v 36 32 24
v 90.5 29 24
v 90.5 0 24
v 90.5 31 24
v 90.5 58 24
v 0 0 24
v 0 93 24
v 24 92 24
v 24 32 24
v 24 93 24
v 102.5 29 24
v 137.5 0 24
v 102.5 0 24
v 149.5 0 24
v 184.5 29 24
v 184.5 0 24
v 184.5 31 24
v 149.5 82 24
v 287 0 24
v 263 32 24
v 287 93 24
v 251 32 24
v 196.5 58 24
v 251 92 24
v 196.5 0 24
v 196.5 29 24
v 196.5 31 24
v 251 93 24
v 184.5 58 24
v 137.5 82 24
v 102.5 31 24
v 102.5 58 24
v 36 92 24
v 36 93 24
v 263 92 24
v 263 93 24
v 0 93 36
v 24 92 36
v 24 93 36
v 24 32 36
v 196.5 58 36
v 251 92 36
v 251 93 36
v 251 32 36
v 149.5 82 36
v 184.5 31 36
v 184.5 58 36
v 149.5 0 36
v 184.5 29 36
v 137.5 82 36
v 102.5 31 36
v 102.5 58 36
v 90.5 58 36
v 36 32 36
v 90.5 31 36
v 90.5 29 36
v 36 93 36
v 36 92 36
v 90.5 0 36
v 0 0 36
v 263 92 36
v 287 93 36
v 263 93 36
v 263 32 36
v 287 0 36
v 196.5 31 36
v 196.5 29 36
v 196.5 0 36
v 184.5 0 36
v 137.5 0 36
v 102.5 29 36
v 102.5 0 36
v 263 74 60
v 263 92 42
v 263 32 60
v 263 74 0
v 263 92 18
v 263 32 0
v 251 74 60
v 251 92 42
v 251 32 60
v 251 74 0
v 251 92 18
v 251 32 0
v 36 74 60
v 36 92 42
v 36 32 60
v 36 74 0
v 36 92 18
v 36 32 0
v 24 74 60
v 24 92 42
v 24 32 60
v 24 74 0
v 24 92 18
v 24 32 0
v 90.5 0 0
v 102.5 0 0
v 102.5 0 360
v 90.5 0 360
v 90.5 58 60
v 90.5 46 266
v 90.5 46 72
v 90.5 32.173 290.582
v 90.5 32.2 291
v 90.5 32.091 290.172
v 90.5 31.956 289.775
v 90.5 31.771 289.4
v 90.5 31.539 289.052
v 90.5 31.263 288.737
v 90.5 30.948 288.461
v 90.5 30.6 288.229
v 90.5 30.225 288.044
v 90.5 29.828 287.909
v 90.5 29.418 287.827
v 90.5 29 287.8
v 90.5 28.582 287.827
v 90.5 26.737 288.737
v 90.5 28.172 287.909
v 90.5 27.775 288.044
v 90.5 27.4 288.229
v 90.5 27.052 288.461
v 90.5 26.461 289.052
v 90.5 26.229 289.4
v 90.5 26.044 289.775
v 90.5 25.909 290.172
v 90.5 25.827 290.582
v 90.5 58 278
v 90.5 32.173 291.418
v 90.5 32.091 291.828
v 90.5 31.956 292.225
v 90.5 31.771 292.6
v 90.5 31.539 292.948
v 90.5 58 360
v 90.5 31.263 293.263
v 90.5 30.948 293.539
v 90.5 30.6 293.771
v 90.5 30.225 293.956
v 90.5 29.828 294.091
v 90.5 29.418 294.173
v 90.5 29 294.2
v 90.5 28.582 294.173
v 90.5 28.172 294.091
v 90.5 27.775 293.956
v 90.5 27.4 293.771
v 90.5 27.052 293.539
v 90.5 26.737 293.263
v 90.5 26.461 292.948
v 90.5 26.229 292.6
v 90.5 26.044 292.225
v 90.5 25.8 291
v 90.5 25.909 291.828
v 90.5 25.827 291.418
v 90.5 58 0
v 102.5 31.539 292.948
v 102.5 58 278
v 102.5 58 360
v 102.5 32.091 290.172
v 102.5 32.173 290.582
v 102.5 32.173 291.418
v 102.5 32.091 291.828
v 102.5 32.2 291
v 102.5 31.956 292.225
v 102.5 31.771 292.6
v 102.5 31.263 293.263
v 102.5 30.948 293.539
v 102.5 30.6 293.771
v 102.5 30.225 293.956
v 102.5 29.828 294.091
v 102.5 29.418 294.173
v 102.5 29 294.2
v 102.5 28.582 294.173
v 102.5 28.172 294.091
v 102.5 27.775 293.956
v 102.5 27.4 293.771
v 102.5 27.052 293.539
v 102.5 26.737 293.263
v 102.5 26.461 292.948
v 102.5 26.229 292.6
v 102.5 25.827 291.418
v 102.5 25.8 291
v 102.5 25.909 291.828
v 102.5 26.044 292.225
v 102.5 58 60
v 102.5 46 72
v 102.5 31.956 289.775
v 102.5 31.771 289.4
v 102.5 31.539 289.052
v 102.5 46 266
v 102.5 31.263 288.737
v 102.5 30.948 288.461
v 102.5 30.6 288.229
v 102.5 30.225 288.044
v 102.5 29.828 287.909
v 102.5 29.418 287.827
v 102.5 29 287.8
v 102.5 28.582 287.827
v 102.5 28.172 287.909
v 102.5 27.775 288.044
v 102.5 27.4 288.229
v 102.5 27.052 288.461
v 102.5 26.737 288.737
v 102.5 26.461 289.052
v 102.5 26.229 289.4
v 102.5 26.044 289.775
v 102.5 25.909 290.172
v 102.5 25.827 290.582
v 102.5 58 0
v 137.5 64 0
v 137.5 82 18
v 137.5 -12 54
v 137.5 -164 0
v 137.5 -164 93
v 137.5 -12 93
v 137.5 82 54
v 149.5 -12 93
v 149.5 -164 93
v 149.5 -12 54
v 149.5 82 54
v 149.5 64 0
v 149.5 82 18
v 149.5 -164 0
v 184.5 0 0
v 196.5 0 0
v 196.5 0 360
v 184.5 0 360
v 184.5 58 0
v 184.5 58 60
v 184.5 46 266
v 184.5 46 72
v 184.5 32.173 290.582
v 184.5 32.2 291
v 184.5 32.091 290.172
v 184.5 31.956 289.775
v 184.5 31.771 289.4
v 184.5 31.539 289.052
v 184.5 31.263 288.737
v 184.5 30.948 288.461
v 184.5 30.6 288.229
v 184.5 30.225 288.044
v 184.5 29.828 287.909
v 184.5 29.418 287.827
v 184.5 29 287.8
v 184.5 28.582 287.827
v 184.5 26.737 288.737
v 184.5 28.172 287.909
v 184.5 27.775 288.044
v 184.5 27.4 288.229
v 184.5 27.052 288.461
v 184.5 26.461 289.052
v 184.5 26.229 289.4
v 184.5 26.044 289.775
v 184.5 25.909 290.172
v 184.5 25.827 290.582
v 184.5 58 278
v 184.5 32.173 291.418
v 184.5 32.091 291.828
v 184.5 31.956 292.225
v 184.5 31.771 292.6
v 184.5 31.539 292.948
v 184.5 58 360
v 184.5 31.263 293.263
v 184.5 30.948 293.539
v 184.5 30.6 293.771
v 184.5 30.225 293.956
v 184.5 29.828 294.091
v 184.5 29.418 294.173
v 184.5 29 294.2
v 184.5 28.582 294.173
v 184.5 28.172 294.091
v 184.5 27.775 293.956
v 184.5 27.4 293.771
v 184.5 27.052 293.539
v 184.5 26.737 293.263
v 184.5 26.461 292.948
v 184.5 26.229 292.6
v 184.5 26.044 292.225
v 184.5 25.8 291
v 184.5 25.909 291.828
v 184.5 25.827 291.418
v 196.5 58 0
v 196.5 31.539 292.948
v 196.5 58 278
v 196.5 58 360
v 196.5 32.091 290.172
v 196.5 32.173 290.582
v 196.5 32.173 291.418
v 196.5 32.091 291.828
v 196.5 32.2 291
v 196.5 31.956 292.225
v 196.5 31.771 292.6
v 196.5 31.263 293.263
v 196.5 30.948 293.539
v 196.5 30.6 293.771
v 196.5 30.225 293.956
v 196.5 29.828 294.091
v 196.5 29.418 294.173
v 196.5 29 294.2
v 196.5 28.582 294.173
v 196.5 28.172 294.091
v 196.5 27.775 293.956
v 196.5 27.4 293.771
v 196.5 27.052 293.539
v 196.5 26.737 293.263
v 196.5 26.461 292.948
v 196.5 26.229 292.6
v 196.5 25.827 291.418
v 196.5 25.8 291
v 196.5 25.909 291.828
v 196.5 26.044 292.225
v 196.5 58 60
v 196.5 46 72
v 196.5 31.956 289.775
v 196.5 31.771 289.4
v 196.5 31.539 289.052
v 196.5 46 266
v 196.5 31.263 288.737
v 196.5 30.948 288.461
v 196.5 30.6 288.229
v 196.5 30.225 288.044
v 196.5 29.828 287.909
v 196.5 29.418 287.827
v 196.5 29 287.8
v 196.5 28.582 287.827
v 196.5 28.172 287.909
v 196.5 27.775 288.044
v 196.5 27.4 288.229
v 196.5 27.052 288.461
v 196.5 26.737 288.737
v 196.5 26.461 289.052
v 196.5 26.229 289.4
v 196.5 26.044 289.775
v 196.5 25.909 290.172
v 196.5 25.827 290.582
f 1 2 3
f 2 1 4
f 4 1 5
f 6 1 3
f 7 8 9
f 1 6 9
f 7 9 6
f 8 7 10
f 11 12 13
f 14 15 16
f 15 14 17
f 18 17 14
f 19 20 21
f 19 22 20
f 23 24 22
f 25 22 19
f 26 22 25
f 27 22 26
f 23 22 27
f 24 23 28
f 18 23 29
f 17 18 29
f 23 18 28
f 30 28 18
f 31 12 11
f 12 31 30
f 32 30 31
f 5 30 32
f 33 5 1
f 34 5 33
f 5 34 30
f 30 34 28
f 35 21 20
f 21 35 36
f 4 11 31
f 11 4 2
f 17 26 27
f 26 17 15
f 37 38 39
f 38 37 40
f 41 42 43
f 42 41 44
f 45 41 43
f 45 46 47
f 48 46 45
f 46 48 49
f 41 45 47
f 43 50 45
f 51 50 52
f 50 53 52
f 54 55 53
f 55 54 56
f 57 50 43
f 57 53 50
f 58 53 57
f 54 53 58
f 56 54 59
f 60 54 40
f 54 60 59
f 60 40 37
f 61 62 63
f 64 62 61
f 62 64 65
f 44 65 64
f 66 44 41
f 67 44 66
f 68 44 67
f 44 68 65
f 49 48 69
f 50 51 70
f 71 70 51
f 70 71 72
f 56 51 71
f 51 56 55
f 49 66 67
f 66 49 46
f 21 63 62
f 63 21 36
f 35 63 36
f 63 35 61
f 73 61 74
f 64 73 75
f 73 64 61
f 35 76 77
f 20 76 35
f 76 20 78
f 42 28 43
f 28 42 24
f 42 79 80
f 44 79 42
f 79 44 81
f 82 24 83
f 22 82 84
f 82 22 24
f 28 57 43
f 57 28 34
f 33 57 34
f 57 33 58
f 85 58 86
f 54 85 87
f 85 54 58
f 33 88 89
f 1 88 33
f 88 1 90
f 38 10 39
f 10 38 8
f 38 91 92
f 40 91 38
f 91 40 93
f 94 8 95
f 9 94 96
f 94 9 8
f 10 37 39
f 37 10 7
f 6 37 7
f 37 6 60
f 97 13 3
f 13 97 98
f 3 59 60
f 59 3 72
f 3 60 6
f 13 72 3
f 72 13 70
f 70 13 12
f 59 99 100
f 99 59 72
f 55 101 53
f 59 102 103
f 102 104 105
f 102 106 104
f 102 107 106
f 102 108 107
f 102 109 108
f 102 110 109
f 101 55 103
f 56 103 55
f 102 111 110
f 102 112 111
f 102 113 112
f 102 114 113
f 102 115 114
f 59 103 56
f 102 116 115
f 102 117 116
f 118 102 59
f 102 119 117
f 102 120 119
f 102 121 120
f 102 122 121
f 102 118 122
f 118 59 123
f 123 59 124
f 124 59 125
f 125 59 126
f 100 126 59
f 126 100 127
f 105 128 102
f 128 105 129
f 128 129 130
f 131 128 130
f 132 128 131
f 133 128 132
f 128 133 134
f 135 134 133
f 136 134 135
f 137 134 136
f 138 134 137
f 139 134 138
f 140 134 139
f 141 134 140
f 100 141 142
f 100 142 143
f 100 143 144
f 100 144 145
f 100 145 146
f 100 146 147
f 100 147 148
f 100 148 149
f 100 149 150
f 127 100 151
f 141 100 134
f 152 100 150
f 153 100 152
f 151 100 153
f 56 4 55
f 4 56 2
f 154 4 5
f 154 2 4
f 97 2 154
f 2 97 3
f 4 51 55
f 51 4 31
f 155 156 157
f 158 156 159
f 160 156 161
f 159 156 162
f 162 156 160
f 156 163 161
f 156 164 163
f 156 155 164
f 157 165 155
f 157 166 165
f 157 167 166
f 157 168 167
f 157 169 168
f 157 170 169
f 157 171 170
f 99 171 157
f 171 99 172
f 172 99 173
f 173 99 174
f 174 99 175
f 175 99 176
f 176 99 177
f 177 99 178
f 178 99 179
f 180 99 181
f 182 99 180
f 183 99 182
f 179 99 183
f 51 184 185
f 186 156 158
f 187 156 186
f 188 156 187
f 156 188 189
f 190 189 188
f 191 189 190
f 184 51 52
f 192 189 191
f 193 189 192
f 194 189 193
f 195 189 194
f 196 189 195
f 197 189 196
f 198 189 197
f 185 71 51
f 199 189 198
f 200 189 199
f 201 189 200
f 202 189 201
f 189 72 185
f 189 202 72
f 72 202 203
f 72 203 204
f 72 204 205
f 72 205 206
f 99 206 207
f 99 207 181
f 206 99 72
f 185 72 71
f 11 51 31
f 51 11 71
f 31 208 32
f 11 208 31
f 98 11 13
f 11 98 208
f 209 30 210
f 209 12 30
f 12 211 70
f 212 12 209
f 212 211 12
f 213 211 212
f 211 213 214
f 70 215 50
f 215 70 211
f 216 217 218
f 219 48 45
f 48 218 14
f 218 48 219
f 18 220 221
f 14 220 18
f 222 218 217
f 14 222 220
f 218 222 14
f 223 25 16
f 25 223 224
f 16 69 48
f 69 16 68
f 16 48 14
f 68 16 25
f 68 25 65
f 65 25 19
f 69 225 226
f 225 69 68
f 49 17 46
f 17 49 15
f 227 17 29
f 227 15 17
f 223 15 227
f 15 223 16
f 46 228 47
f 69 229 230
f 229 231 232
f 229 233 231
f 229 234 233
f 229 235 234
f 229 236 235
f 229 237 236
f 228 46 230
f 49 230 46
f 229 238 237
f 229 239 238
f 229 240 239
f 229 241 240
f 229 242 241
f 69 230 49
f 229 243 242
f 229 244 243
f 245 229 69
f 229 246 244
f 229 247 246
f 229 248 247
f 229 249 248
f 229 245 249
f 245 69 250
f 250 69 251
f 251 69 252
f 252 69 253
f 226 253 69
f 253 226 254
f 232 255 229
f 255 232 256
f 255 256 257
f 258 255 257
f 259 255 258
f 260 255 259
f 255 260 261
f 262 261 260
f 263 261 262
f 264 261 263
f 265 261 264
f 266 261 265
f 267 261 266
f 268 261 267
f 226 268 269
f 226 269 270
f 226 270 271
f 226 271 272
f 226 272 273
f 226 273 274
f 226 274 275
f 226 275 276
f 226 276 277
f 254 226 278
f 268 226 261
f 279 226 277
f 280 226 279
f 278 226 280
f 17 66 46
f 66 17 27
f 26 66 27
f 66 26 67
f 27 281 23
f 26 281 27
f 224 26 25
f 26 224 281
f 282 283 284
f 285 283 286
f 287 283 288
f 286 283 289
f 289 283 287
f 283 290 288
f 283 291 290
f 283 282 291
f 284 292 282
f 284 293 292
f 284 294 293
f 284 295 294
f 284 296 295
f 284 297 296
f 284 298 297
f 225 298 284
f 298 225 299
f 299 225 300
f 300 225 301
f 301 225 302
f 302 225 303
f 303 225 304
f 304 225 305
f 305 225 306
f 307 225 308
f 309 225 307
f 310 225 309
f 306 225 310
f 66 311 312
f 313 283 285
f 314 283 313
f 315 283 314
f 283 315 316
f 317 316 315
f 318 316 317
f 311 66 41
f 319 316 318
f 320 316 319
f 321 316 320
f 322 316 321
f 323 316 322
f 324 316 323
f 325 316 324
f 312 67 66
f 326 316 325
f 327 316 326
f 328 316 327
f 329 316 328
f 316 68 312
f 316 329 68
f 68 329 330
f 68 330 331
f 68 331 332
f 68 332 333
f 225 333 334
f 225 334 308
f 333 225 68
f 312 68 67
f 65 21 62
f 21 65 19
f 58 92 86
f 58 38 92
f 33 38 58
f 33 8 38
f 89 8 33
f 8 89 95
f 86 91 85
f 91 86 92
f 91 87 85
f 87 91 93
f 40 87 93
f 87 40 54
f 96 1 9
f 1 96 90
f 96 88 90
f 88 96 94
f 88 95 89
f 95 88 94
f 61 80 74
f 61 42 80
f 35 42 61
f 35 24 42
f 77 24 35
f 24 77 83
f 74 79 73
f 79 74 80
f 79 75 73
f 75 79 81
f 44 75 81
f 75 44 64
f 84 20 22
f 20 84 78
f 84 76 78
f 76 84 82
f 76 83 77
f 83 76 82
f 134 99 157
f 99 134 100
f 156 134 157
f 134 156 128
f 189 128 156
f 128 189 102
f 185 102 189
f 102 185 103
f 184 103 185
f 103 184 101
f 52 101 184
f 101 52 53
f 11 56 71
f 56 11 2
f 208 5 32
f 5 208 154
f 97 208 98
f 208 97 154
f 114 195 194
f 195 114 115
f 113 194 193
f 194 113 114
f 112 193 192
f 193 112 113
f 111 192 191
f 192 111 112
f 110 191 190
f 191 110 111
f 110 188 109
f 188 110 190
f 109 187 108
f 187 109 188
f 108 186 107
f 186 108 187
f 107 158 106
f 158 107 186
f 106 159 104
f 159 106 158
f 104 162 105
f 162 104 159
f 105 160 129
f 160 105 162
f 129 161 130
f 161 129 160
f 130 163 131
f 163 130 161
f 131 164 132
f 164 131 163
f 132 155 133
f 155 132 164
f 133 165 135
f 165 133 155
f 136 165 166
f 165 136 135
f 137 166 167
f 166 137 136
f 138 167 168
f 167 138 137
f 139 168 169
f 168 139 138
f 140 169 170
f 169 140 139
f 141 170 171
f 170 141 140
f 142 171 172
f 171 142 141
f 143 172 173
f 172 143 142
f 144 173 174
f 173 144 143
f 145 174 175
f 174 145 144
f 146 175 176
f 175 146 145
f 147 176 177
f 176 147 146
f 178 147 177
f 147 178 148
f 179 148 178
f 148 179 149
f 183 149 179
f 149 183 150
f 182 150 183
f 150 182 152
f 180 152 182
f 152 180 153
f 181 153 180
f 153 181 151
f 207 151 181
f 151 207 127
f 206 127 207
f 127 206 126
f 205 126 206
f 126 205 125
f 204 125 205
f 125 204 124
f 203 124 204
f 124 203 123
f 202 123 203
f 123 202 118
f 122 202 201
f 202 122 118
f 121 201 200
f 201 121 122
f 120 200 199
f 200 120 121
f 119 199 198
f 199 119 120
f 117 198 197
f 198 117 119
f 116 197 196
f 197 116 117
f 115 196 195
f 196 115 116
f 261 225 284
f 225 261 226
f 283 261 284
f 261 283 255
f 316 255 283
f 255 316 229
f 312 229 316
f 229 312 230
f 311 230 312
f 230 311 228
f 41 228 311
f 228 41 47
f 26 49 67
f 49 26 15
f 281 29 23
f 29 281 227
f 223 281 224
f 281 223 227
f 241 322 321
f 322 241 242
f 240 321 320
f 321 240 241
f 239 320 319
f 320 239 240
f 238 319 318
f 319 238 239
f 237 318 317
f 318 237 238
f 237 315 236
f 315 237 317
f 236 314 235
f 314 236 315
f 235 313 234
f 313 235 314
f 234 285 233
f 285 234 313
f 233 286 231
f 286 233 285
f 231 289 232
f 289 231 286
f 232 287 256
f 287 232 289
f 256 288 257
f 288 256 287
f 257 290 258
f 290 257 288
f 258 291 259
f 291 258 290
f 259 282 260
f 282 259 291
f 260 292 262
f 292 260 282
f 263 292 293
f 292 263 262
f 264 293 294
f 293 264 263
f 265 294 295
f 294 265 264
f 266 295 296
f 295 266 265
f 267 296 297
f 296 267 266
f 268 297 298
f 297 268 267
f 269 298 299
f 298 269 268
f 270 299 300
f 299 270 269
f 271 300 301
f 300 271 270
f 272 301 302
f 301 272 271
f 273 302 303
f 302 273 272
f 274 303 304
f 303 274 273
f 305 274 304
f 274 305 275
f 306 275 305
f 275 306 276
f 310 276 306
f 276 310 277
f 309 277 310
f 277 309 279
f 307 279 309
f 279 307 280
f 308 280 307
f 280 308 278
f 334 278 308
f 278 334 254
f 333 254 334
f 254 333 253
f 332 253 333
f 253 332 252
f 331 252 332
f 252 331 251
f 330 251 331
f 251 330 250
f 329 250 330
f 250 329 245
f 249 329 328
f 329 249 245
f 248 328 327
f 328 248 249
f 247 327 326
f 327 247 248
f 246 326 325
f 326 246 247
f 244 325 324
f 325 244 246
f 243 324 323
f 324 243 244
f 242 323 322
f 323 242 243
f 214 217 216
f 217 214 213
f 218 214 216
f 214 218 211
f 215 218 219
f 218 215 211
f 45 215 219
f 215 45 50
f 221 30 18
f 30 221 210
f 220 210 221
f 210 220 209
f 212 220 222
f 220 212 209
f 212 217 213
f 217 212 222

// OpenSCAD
// ==========================================================================
//  GENERATED FILE -- DO NOT EDIT.
//  Produced by build/build.py from components/Turtle_Bottom_Ballast_Fin_v1.scad
//  Turtle Body version 1.8.3
//  Edit lib/ and src/ instead, then run: python3 build/build.py
// ==========================================================================
/*
 Hope Turtle — standalone ballast attachment. Units: mm.
 License: CERN-OHL-S-2.0.
 Two green core slats, one orange bottom board, two red lock feet, one
 yellow ballast fin. No bottle. Individual pieces lie flat on Z=0;
 the assembly raises its lowest component to Z=0.

 SOURCE FILE — geometry lives in lib/ballast_fin.scad + lib/params.scad.
 The committed self-contained file is generated by build/build.py.
*/

part = "assembly"; // [assembly,core_slat,bottom_board,lock_foot,fin]
enable_color_coding = true;
ballast_fin_inspection_pullout = 0; // mm; 0 seats the fin

// [bundle] begin use <../../lib/ballast_fin.scad>
// ==========================================================================
//  Turtle Body -- bottom ballast attachment  (lib module)
// --------------------------------------------------------------------------
//  Two green core slats, one orange bottom board, two red lock feet, one
//  yellow ballast fin. No bottle. See CLAUDE.md s12.
//
//  Use clear inner-face spacing (= bottle_diameter), not centre spacing, for
//  bottle clearance. The yellow fin's bottle-seat cut is enlarged by one
//  stock thickness so the bottle clears it -- preserved here. Ballast joints
//  keep nominal stock slot widths (the rear fin's 0.2 mm allowance is NOT
//  added here).
//
//  Definitions only. Geometry is emitted by local_ballast_assembly() or the
//  individual part modules.
// ==========================================================================

// [bundle] begin use <params.scad>
// ==========================================================================
//  Turtle Body -- shared dimension contract
// --------------------------------------------------------------------------
//  The single source of truth for every dimension that more than one
//  subsystem depends on. Values are exposed as zero-argument functions so
//  this file can be pulled in with `use <params.scad>` (which ignores
//  top-level variable assignments) without polluting any namespace.
//
//  lib/ modules take these as DEFAULT argument values:
//      module control_cap(roof_t = p_cap_roof_t(), ...) { ... }
//  so a src/ wrapper can still override one value from its customizer block
//  while every other subsystem keeps the shared number.
//
//  Rules:
//   * one function per concept, canonical name (see CLAUDE.md cross-file table)
//   * derived values are functions of other p_*() functions, never re-typed
//   * mm throughout; names say _d (diameter), _r (radius), _t (thickness),
//     _len / _h (axial), _af (hex across-flats)
//   * do NOT add a bare `x = ...;` here -- bundle.py / lint.py will reject it
// ==========================================================================

// ---- tolerances and render quality --------------------------------------
function p_eps()          = 0.02;   // Boolean overlap / cut-through fudge
function p_fit_clearance() = 0.2;   // wood joint: TOTAL extra slot width, centred on the board
function p_fn_plastic()   = 120;    // printed PLA parts (cap, cage, axle, mold)
function p_fn_wood()      = 96;     // cut wooden parts
function p_fn_curve()     = 180;    // fine profile curves (bottle, sails)

// ---- bottle (the foundation reference) ---------------------------------
function p_bottle_d()        = 82;    // outside diameter
function p_bottle_h()        = 305;   // total height incl. ordinary screw cap
function p_bottle_wall_t()   = 0.5;   // modelling assumption, not a measurement
function p_bottle_cap_d()    = 31;    // ordinary screw cap (NOT the control-cap disk)
function p_bottle_cap_h()    = 17;    // ordinary screw cap height (rear-fin / ballast formulas)
function p_collar_d()        = 34;    // bottle collar, independent of cap diameter
function p_top_dome_h()      = 62;
function p_bottom_dome_h()   = 25;
function p_dome_power()      = 2.5;   // superellipse exponent
function p_bottle_neck_h()   = 5;
function p_bottle_collar_h() = 1;
function p_bottle_neck_d()   = p_bottle_cap_d() - 3;   // 28: neck is 3 mm under the cap
function p_bottle_base_ratio() = 0.88; // slightly narrower footprint at the base
function p_bottle_profile_steps() = 16;
// cut bottle (control head): the lower dome is removed and a short socket is
// bored so the control-cap insert slides in. Cut plane sits 5 mm above the
// bottom dome height.
function p_bottle_cut_extra()  = 5;
function p_bottle_cut_height() = p_bottom_dome_h() + p_bottle_cut_extra();   // 30

// nominal bottle interior and the cap insert that enters it
function p_bottle_socket_d() = p_bottle_d() - 2 * p_bottle_wall_t();          // 81
function p_insert_shaft_radial_clearance() = 1;
function p_insert_shaft_d()  = p_bottle_socket_d()
                             - 2 * p_insert_shaft_radial_clearance();          // 79

// ---- wooden stock -----------------------------------------------------
function p_wood_t()          = 12;    // shared board / slat thickness
function p_fin_board_w()     = 93;    // shared fin-system stock width
function p_screw_side_offset() = 25;  // mounting-hole inset from a John end

// ---- Ecojoiner port --------------------------------------------------
// A port must swallow the bottle's tapered top (the top dome) plus a seating
// allowance, so its axial length is DERIVED from the bottle, not fixed. This
// is the same rule the HopeTurtles.org generators use
// (port_length = taper_height + port_allowance); until 2026-09-08 lib carried
// the evaluated constant 82 instead, which silently broke the rule for any
// bottle other than the reference one. Ballast and Ecojoiner both read it.
function p_port_allowance()  = 20;                 // seating allowance beyond the dome
function p_port_length()     = p_top_dome_h() + p_port_allowance();   // 62 + 20 = 82
function p_port_height()     = p_bottle_d();       // opening height == bottle diameter (asserted)

// ---- M6 hardware ---------------------------------------------------
function p_m6_clearance_d()  = 6.4;   // M6 clearance hole
function p_m6_bolt_shaft_d() = 6;     // visual placeholder only
function p_m6_bolt_head_d()  = 12;
function p_m6_bolt_head_t()  = 4;

// ---- control cap (large stationary disk; see CLAUDE.md s7) ----------
//  TB-03 resolution: repository 5 mm roof / 2 mm boss is authoritative;
//  the axle (below) is derived to this datum.
function p_cap_disk_d()      = 100;   // control-cap disk (independent of p_bottle_cap_d)
function p_cap_roof_t()      = 5;     // disk / roof thickness
function p_cap_boss_depth()  = 2;     // extra projection of the centre boss into the hollow cap
function p_cap_boss_d()      = 18;
function p_cap_insert_len()  = 35;    // straight insert shaft length
function p_cap_insert_wall_t() = 4;
function p_cap_entry_chamfer_h()     = 1;
function p_cap_entry_chamfer_delta() = 1;
function p_cap_axle_bore_d() = 8.6;   // 0.3 mm radial clearance to the Ø8 shaft
function p_cap_cage_radial_clearance() = 1;   // cap disk -> cage inner wall (radial)
function p_cap_total_h()     = p_cap_roof_t() + p_cap_insert_len();           // 40
function p_cap_bearing_len() = p_cap_roof_t() + p_cap_boss_depth();           // 7

// buttons (through both cap and cage)
function p_button_upper_d()  = 17;    // clearance hole in the cap
function p_button_axis()     = "y";   // "x" or "y"
function p_button_radius()   = 24;    // radial position of the two button centres (48 mm apart)

// ---- silicone seal grooves + rings (CLAUDE.md s8) ------------------
function p_seal_groove_count()      = 2;
function p_seal_groove_axial_h()    = 2;   // groove height
function p_seal_groove_radial_depth() = 2; // groove depth
function p_seal_groove1_from_shoulder() = 12;  // groove centre, measured from the insert SHOULDER
function p_seal_groove2_from_shoulder() = 25;
function p_seal_ring_axial_t()      = 1.5;  // cast ring thickness
function p_seal_ring_radial_w()     = 5;    // NOT validated; 3.5 was a suggested milder prototype
function p_seal_groove_root_d() = p_insert_shaft_d()
                                - 2 * p_seal_groove_radial_depth();            // 75

// ---- round / hex centre axle (CLAUDE.md s9) -----------------------
//  Derived to the 5/2 cap datum (TB-03/TB-04). round_inside_cap is measured
//  from the roof underside and INCLUDES the boss -- do not add the boss again.
function p_axle_round_d()        = 8;
function p_axle_round_ext()      = 1;    // projection above the cap's outer face
function p_axle_round_inside_cap() = p_cap_insert_len() - 5;  // 30: roof underside to round end (incl. boss)
function p_axle_round_len()      = p_axle_round_inside_cap() + p_cap_roof_t() + p_axle_round_ext();  // 36
function p_axle_hex_af()         = 10.0; // shaft across-flats (0.3 mm to the Ø10.3 cage bore)
function p_axle_hex_len()        = 23;
function p_axle_join_overlap()   = 0.2;  // hex<->round Boolean overlap
function p_axle_total_len()      = p_axle_hex_len() + p_axle_round_len();
function p_axle_hex_corner_d()   = p_axle_hex_af() / cos(30);                  // ~11.55
function p_magnet_d()            = 3;    // AS5600 sensing magnet recess
function p_magnet_t()            = 1;

// ---- axle rotary shaft O-ring (waterproofs the axle bore; cast in the mold) ----
//  A round-section O-ring seated in a gland in the control-cap bore, sealing
//  against the spinning round section of the axle. ID is tied to the shaft.
function p_axle_oring_cs()     = 2.0;                                   // cross-section
function p_axle_oring_id()     = p_axle_round_d();                      // 8 -- hugs the shaft
function p_axle_oring_od()     = p_axle_oring_id() + 2 * p_axle_oring_cs();          // 12
function p_axle_oring_mean_r() = (p_axle_oring_id() + p_axle_oring_cs()) / 2;        // 5
//  gland cut into the cap bore for it
function p_cap_oring_squeeze()      = 0.25;  // radial squeeze on the seal
function p_cap_oring_gland_od()     = p_axle_oring_od() - 2 * p_cap_oring_squeeze(); // 11.5
function p_cap_oring_gland_w()      = 1.3 * p_axle_oring_cs();                       // 2.6 axial
function p_cap_oring_gland_from_face() = 3.5; // gland centre, from the cap outer face, along the bore

// ---- rotating control cage (CLAUDE.md s6) ------------------------
function p_cage_wall_t()     = 6.5;   // radial wall thickness
function p_cage_roof_t()     = 6;     // roof / surface plate thickness
function p_cage_inner_d()    = p_cap_disk_d() + 2 * p_cap_cage_radial_clearance();   // 102
function p_cage_outer_d()    = p_cage_inner_d() + 2 * p_cage_wall_t();               // 115
function p_cage_skirt_depth()   = 44;   // roof underside to the ORIGINAL skirt rim
function p_cage_peak_extension() = 20;  // crest extends this far past the original rim
function p_cage_valley_wall_h()  = 10;  // minimum wall depth between mounts
function p_cage_total_h()    = p_cage_skirt_depth() + p_cage_roof_t();              // 50 (native)
function p_cage_notch_count()   = 4;
function p_cage_notch_w()    = 22.5;  // batten groove width
function p_cage_notch_depth() = 3.7;
function p_cage_wave_segments() = 240;
function p_cage_hub_d()      = 29;
function p_cage_pocket_d()   = 26;    // top clip pocket
function p_cage_pocket_depth() = 4;
function p_cage_hex_bore_af() = 10.3; // central hex bore (0.3 mm to the Ø10.0 shaft)
function p_cage_bearing_d()  = 9;     // hemispherical bearing bump
function p_cage_bearing_count() = 8;
function p_cage_bearing_pcd() = p_cap_disk_d() - p_cage_bearing_d() + 0.5;          // 91.5
function p_cage_top_hole_d() = 18;    // central button / access hole through the roof
function p_cage_mount_hole_d() = 3.2; // two M3 clearance holes per batten / groove
function p_cage_mount_pitch()  = 32;  // vertical pitch of the pair
function p_cage_lower_hole_from_tip() = 10;
// 45-deg outward chamfer on the roof-top outer edge (0 = sharp). The cage
// prints roof-face-down, so this bevel flares OUT from the bed and stays
// printable; it is masked away around each batten groove. See lib/control_cage.scad.
function p_cage_roof_bevel() = 4;

// ---- sail apparatus (CLAUDE.md s10) ---------------------------
function p_side_batten_h()   = 205;
function p_side_batten_w()   = 20;
function p_side_batten_radial_t() = 10;
function p_top_crossbar_len() = 6 * p_bottle_d();   // 492
function p_top_crossbar_w()  = 22;
function p_top_crossbar_t()  = p_wood_t();          // 12
function p_sail_bar_axle_hole_d() = 12;             // Ø12; fits the ~11.55 hex corner dia
function p_bottom_rail_len() = 3 * p_bottle_d();    // 246
function p_bottom_rail_bottle_clearance() = 1;
function p_sail_rail_color()  = [0.56, 0.39, 0.39]; // brown (top AND bottom rails)
function p_c_piece_color()    = [1.0, 0.52, 0.20];  // orange, retained

// ---- rear fin + solar support (CLAUDE.md s11) ----------------
function p_solar_panel_w() = 148;
function p_solar_panel_h() = 223;
function p_solar_panel_t() = 2.5;    // real panel, independent of wood thickness
function p_rear_shaft_len() = p_bottle_h()
                            + (2/3) * (p_fin_board_w() - 2 * p_wood_t())
                            - p_bottle_cap_h();                                 // 334
function p_rear_half_lap_engagement() = 42;   // green/yellow interlock depth
function p_rear_fin_tab_width() = 15;
function p_rear_shaft_width()   = 59;
// TB-07: the green-slat mounting hole follows the mating Ecojoiner John, not a
// fixed 50 mm. Derived from the install transform; the john_length/2 terms
// cancel, leaving a pure function of the shared contract (= 103 at defaults).
function p_rear_shaft_hole_from_front() =
    p_rear_shaft_len() - p_screw_side_offset() - p_bottle_h()
    + p_bottle_cap_h() + p_port_height();

// ---- ballast attachment (CLAUDE.md s12) ---------------------
function p_ballast_core_w()   = p_bottle_d() - 2 * p_wood_t();                  // 58
function p_ballast_core_len() = p_bottle_h() - p_bottle_cap_h() + 6 * p_wood_t();  // 360
function p_ballast_slat_gap() = p_bottle_d();          // clear inner-face gap
function p_ballast_slat_spacing() = p_bottle_d() + p_wood_t();                  // 94
function p_ballast_board_len() = 3.5 * p_bottle_d();   // 287
function p_ballast_fin_len()   = 3 * p_bottle_d();     // 246
function p_ballast_lock_w()    = 5 * p_wood_t();       // 60
// [bundle] end   <params.scad>
// [bundle] begin use <util.scad>
// ==========================================================================
//  Turtle Body -- shared helper modules and functions
// --------------------------------------------------------------------------
//  Small pieces that were copy-pasted across the standalone files. Geometry
//  lives in the per-subsystem lib/ modules; this file is only glue.
//
//  Definitions only -- no top-level geometry, no top-level assignments.
// ==========================================================================

// [bundle] begin use <params.scad>
// [bundle] already inlined: params.scad
// [bundle] end   <params.scad>

// Colour wrapper for wooden parts. When colour coding is off, every wooden
// component renders in one neutral wood tone; bottles, hardware, sails and
// printed parts keep their own colours and never call this.
module wood_color(coded_color, enabled = true, neutral = [0.94, 0.83, 0.62]) {
    color(enabled ? coded_color : neutral) children();
}

// scalar clamp
function clamp(v, lo, hi) = v < lo ? lo : (v > hi ? hi : v);

// Visual-only M6 bolt: plain shaft + hex-less cylindrical head. No thread,
// no torque rating -- a placeholder for fit inspection.
//  Local Z=0 is the underside of the head; the shaft runs toward +Z from Z=0
//  (plus an optional tip_extension), the head sits at Z=-head_t..0. Matches
//  the standalone files.
module m6_bolt_placeholder(grip_length, tip_extension = 1,
                           shaft_d = undef, head_d = undef, head_t = undef,
                           color_rgb = [0.15, 0.15, 0.15], fn = 48) {
    sd = shaft_d == undef ? p_m6_bolt_shaft_d() : shaft_d;
    hd = head_d  == undef ? p_m6_bolt_head_d()  : head_d;
    ht = head_t  == undef ? p_m6_bolt_head_t()  : head_t;
    assert(grip_length > 0, "m6_bolt_placeholder: grip_length must be positive.");
    color(color_rgb)
        union() {
            cylinder(d = sd, h = grip_length + tip_extension, $fn = fn);
            translate([0, 0, -ht])
                cylinder(d = hd, h = ht, $fn = fn);
        }
}

// Regular hexagonal prism specified by across-flats width (OpenSCAD's
// cylinder($fn=6) is specified across corners, which is the usual trap).
module hex_prism_af(across_flats, h, center = false) {
    cylinder(d = across_flats / cos(30), h = h, $fn = 6, center = center);
}
// [bundle] end   <util.scad>

function bl_t()            = p_wood_t();
function bl_core_w()       = p_bottle_d() - 2 * bl_t();                          // 58
function bl_core_h()       = p_bottle_h() - p_bottle_cap_h() + 6.0 * bl_t();     // 360
function bl_lower_lobe()   = 2 * bl_t();
function bl_upper_lobe()   = 2 * bl_t();
function bl_core_slot_h()  = bl_t();
function bl_core_slot_depth() = bl_core_w() / 2;
function bl_neck_w()       = p_bottle_d() - 3 * bl_t();                          // 46
function bl_shoulder_step()   = bl_core_w() - bl_neck_w();                       // 12
function bl_upper_diag_start() = bl_core_h() - p_port_height();
function bl_upper_neck_start() = bl_upper_diag_start() - bl_shoulder_step();
function bl_core_slot_z0() = bl_lower_lobe();
function bl_core_slot_z1() = bl_core_slot_z0() + bl_core_slot_h();
function bl_lower_full_return() = bl_core_slot_z1() + bl_upper_lobe();
function bl_lower_neck_start()  = bl_lower_full_return() + bl_shoulder_step();
function bl_mount_hole_from_top() = p_port_length() + bl_t() - p_screw_side_offset();  // 69
function bl_mount_hole_x()  = bl_core_w() / 2;
function bl_mount_hole_y()  = bl_core_h() - bl_mount_hole_from_top();

function bl_board_len()    = 3.5 * p_bottle_d();                                 // 287
function bl_board_w()      = p_fin_board_w();                                    // 93
function bl_board_slot_w() = bl_t();
function bl_board_slot_depth()  = p_fin_board_w() / 3;
function bl_center_slot_depth() = p_bottle_d() / 2;
function bl_center_slot()  = bl_board_len() / 2;
function bl_slat_spacing() = p_bottle_d() + bl_t();                             // 94
function bl_left_slot()    = bl_center_slot() - bl_slat_spacing() / 2;
function bl_right_slot()   = bl_center_slot() + bl_slat_spacing() / 2;
function bl_end_slot_offset() = 2 * bl_t();
function bl_left_end_slot_x0()  = bl_end_slot_offset();
function bl_right_end_slot_x0() = bl_board_len() - bl_end_slot_offset() - bl_board_slot_w();

function bl_lock_w()       = 5 * bl_t();                                         // 60
function bl_lock_h()       = 5 * bl_t();
function bl_lock_t()       = bl_t();
function bl_lock_slot_depth() = bl_lock_w() / 2;
function bl_lock_slot_h()  = bl_t();
function bl_lock_chamfer() = 1.5 * bl_t();

function bl_fin_len()      = 3 * p_bottle_d();                                   // 246
function bl_fin_h()        = p_fin_board_w();                                    // 93
function bl_fin_t()        = bl_t();
function bl_fin_lower_protrusion() = 2 * bl_t();
function bl_fin_slot_h()   = bl_t();
function bl_fin_slot_depth()   = p_bottle_d() / 2;
function bl_fin_upper_cut_depth() = p_bottle_d() + bl_t();   // +1 stock thickness so the bottle clears
function bl_fin_upper_cut_z0()    = bl_fin_lower_protrusion() + bl_fin_slot_h() + 1.5 * bl_t();
function bl_fin_front_chamfer()   = 1.5 * bl_t();

module bl_assert_valid() {
    t = bl_t();
    assert(p_bottle_h() > p_bottle_cap_h() && t > 0 && p_bottle_d() > 3 * t);
    assert(bl_core_h() - p_bottle_d() - t > 6 * t, "ballast: slat shoulders overlap.");
    assert(p_m6_clearance_d() > 0 && p_m6_clearance_d() < p_bottle_d() - 2 * t);
    assert(bl_mount_hole_from_top() > p_m6_clearance_d() / 2
           && bl_mount_hole_from_top() < p_bottle_d() - p_m6_clearance_d() / 2,
           "ballast: mount hole misses the upper slat end.");
    assert(p_fin_board_w() > max(4.5 * t, p_bottle_d() / 2), "ballast: fin board too narrow.");
    assert(bl_core_w() == p_port_height() - 2 * t,
           "ballast: slat width must use the shared bottle diameter.");
    assert(abs((bl_core_h() - bl_upper_diag_start()) - p_port_height()) < 0.001,
           "ballast: top shoulder cut must begin one port_height below the slat top.");
    assert(abs((bl_slat_spacing() - bl_t()) - p_bottle_d()) < 0.001,
           "ballast: slat inner-face gap must equal the shared bottle diameter.");
    assert(abs(bl_center_slot_depth() - bl_fin_slot_depth()) < 0.001,
           "ballast: orange-base and yellow-fin slots must have equal depth.");
}

// ---- 2D profiles + parts -------------------------------------------
module bl_core_profile_2d()
    polygon([[0, 0], [bl_core_w(), 0],
             [bl_core_w(), bl_core_h()], [0, bl_core_h()],
             [0, bl_upper_diag_start()],
             [bl_shoulder_step(), bl_upper_neck_start()],
             [bl_shoulder_step(), bl_lower_neck_start()],
             [0, bl_lower_full_return()],
             [0, bl_core_slot_z1()],
             [bl_core_slot_depth(), bl_core_slot_z1()],
             [bl_core_slot_depth(), bl_core_slot_z0()],
             [0, bl_core_slot_z0()]]);

module ballast_core_slat_part(colored = true)
    wood_color([0.12, 0.38, 0.20], colored)
        linear_extrude(height = bl_t()) difference() {
            bl_core_profile_2d();
            translate([bl_mount_hole_x(), bl_mount_hole_y()])
                circle(d = p_m6_clearance_d(), $fn = 48);
        }

module ballast_bottom_board_part(colored = true) {
    e = 0.01;
    wood_color([0.90, 0.38, 0.06], colored)
    linear_extrude(height = bl_t()) difference() {
        square([bl_board_len(), bl_board_w()]);
        translate([bl_left_slot() - bl_board_slot_w() / 2, -e])
            square([bl_board_slot_w(), bl_board_slot_depth() + e]);
        translate([bl_center_slot() - bl_board_slot_w() / 2, -e])
            square([bl_board_slot_w(), bl_center_slot_depth() + e]);
        translate([bl_right_slot() - bl_board_slot_w() / 2, -e])
            square([bl_board_slot_w(), bl_board_slot_depth() + e]);
        translate([bl_left_end_slot_x0(), bl_board_w() - bl_board_slot_depth()])
            square([bl_board_slot_w(), bl_board_slot_depth() + e]);
        translate([bl_right_end_slot_x0(), bl_board_w() - bl_board_slot_depth()])
            square([bl_board_slot_w(), bl_board_slot_depth() + e]);
    }
}

module bl_lock_profile_2d() {
    y0 = (bl_lock_h() - bl_lock_slot_h()) / 2;
    y1 = y0 + bl_lock_slot_h();
    ch = bl_lock_chamfer();
    polygon([[0, 0], [bl_lock_w() - ch, 0], [bl_lock_w(), ch],
             [bl_lock_w(), bl_lock_h() - ch], [bl_lock_w() - ch, bl_lock_h()],
             [0, bl_lock_h()], [0, y1], [bl_lock_slot_depth(), y1],
             [bl_lock_slot_depth(), y0], [0, y0]]);
}

module ballast_lock_part(colored = true)
    wood_color([0.70, 0.12, 0.10], colored)
        linear_extrude(height = bl_lock_t()) bl_lock_profile_2d();

module bl_fin_profile_2d() {
    e = 0.01; ch = bl_fin_front_chamfer();
    difference() {
        polygon([[ch, 0], [bl_fin_len(), 0], [bl_fin_len(), bl_fin_h()],
                 [0, bl_fin_h()], [0, ch]]);
        translate([-e, bl_fin_lower_protrusion()])
            square([bl_fin_slot_depth() + e, bl_fin_slot_h()]);
        translate([-e, bl_fin_upper_cut_z0()])
            square([bl_fin_upper_cut_depth() + e, bl_fin_h() - bl_fin_upper_cut_z0() + e]);
    }
}

module ballast_fin_part(colored = true)
    wood_color([0.95, 0.72, 0.02], colored)
        linear_extrude(height = bl_fin_t()) bl_fin_profile_2d();

// ---- local assembly ------------------------------------------------
module bl_installed_green_slat(slot_center_x, colored = true)
    multmatrix([[0, 0, 1, slot_center_x - bl_t() / 2],
                [-1, 0, 0, bl_core_w()],
                [0, 1, 0, -bl_core_slot_z0()],
                [0, 0, 0, 1]])
        ballast_core_slat_part(colored);

module bl_installed_lock(slot_x0, colored = true) {
    lock_center_x = slot_x0 + bl_board_slot_w() / 2;
    lock_origin_y = (bl_board_w() - bl_board_slot_depth()) - bl_lock_slot_depth();
    y0 = (bl_lock_h() - bl_lock_slot_h()) / 2;
    multmatrix([[0, 0, 1, lock_center_x - bl_lock_t() / 2],
                [1, 0, 0, lock_origin_y],
                [0, 1, 0, -y0],
                [0, 0, 0, 1]])
        ballast_lock_part(colored);
}

module bl_installed_fin(inspection_pullout = 0, colored = true) {
    fin_origin_y = bl_center_slot_depth() + bl_fin_slot_depth() + inspection_pullout;
    multmatrix([[0, 0, 1, bl_center_slot() - bl_fin_t() / 2],
                [-1, 0, 0, fin_origin_y],
                [0, 1, 0, -bl_fin_lower_protrusion()],
                [0, 0, 0, 1]])
        ballast_fin_part(colored);
}

module local_ballast_assembly(inspection_pullout = 0, colored = true) {
    bl_assert_valid();
    ballast_bottom_board_part(colored);
    bl_installed_lock(bl_left_end_slot_x0(), colored);
    bl_installed_lock(bl_right_end_slot_x0(), colored);
    bl_installed_green_slat(bl_left_slot(), colored);
    bl_installed_green_slat(bl_right_slot(), colored);
    bl_installed_fin(inspection_pullout, colored);

    echo("BALLAST: slat w/len/t = ", bl_core_w(), bl_core_h(), bl_t(),
         " | inner-face gap = ", bl_slat_spacing() - bl_t(),
         " | M6 from slat top = ", bl_mount_hole_from_top());
}
// [bundle] end   <../../lib/ballast_fin.scad>

if (part == "assembly") {
    translate([0, 0, max(bl_lower_lobe(),
                         (bl_lock_h() - bl_lock_slot_h()) / 2,
                         bl_fin_lower_protrusion())])
        local_ballast_assembly(inspection_pullout = ballast_fin_inspection_pullout,
                               colored = enable_color_coding);
} else if (part == "core_slat") {
    ballast_core_slat_part(colored = enable_color_coding);
} else if (part == "bottom_board") {
    ballast_bottom_board_part(colored = enable_color_coding);
} else if (part == "lock_foot") {
    ballast_lock_part(colored = enable_color_coding);
} else if (part == "fin") {
    ballast_fin_part(colored = enable_color_coding);
} else {
    assert(false, str("Unknown part: ", part));
}
